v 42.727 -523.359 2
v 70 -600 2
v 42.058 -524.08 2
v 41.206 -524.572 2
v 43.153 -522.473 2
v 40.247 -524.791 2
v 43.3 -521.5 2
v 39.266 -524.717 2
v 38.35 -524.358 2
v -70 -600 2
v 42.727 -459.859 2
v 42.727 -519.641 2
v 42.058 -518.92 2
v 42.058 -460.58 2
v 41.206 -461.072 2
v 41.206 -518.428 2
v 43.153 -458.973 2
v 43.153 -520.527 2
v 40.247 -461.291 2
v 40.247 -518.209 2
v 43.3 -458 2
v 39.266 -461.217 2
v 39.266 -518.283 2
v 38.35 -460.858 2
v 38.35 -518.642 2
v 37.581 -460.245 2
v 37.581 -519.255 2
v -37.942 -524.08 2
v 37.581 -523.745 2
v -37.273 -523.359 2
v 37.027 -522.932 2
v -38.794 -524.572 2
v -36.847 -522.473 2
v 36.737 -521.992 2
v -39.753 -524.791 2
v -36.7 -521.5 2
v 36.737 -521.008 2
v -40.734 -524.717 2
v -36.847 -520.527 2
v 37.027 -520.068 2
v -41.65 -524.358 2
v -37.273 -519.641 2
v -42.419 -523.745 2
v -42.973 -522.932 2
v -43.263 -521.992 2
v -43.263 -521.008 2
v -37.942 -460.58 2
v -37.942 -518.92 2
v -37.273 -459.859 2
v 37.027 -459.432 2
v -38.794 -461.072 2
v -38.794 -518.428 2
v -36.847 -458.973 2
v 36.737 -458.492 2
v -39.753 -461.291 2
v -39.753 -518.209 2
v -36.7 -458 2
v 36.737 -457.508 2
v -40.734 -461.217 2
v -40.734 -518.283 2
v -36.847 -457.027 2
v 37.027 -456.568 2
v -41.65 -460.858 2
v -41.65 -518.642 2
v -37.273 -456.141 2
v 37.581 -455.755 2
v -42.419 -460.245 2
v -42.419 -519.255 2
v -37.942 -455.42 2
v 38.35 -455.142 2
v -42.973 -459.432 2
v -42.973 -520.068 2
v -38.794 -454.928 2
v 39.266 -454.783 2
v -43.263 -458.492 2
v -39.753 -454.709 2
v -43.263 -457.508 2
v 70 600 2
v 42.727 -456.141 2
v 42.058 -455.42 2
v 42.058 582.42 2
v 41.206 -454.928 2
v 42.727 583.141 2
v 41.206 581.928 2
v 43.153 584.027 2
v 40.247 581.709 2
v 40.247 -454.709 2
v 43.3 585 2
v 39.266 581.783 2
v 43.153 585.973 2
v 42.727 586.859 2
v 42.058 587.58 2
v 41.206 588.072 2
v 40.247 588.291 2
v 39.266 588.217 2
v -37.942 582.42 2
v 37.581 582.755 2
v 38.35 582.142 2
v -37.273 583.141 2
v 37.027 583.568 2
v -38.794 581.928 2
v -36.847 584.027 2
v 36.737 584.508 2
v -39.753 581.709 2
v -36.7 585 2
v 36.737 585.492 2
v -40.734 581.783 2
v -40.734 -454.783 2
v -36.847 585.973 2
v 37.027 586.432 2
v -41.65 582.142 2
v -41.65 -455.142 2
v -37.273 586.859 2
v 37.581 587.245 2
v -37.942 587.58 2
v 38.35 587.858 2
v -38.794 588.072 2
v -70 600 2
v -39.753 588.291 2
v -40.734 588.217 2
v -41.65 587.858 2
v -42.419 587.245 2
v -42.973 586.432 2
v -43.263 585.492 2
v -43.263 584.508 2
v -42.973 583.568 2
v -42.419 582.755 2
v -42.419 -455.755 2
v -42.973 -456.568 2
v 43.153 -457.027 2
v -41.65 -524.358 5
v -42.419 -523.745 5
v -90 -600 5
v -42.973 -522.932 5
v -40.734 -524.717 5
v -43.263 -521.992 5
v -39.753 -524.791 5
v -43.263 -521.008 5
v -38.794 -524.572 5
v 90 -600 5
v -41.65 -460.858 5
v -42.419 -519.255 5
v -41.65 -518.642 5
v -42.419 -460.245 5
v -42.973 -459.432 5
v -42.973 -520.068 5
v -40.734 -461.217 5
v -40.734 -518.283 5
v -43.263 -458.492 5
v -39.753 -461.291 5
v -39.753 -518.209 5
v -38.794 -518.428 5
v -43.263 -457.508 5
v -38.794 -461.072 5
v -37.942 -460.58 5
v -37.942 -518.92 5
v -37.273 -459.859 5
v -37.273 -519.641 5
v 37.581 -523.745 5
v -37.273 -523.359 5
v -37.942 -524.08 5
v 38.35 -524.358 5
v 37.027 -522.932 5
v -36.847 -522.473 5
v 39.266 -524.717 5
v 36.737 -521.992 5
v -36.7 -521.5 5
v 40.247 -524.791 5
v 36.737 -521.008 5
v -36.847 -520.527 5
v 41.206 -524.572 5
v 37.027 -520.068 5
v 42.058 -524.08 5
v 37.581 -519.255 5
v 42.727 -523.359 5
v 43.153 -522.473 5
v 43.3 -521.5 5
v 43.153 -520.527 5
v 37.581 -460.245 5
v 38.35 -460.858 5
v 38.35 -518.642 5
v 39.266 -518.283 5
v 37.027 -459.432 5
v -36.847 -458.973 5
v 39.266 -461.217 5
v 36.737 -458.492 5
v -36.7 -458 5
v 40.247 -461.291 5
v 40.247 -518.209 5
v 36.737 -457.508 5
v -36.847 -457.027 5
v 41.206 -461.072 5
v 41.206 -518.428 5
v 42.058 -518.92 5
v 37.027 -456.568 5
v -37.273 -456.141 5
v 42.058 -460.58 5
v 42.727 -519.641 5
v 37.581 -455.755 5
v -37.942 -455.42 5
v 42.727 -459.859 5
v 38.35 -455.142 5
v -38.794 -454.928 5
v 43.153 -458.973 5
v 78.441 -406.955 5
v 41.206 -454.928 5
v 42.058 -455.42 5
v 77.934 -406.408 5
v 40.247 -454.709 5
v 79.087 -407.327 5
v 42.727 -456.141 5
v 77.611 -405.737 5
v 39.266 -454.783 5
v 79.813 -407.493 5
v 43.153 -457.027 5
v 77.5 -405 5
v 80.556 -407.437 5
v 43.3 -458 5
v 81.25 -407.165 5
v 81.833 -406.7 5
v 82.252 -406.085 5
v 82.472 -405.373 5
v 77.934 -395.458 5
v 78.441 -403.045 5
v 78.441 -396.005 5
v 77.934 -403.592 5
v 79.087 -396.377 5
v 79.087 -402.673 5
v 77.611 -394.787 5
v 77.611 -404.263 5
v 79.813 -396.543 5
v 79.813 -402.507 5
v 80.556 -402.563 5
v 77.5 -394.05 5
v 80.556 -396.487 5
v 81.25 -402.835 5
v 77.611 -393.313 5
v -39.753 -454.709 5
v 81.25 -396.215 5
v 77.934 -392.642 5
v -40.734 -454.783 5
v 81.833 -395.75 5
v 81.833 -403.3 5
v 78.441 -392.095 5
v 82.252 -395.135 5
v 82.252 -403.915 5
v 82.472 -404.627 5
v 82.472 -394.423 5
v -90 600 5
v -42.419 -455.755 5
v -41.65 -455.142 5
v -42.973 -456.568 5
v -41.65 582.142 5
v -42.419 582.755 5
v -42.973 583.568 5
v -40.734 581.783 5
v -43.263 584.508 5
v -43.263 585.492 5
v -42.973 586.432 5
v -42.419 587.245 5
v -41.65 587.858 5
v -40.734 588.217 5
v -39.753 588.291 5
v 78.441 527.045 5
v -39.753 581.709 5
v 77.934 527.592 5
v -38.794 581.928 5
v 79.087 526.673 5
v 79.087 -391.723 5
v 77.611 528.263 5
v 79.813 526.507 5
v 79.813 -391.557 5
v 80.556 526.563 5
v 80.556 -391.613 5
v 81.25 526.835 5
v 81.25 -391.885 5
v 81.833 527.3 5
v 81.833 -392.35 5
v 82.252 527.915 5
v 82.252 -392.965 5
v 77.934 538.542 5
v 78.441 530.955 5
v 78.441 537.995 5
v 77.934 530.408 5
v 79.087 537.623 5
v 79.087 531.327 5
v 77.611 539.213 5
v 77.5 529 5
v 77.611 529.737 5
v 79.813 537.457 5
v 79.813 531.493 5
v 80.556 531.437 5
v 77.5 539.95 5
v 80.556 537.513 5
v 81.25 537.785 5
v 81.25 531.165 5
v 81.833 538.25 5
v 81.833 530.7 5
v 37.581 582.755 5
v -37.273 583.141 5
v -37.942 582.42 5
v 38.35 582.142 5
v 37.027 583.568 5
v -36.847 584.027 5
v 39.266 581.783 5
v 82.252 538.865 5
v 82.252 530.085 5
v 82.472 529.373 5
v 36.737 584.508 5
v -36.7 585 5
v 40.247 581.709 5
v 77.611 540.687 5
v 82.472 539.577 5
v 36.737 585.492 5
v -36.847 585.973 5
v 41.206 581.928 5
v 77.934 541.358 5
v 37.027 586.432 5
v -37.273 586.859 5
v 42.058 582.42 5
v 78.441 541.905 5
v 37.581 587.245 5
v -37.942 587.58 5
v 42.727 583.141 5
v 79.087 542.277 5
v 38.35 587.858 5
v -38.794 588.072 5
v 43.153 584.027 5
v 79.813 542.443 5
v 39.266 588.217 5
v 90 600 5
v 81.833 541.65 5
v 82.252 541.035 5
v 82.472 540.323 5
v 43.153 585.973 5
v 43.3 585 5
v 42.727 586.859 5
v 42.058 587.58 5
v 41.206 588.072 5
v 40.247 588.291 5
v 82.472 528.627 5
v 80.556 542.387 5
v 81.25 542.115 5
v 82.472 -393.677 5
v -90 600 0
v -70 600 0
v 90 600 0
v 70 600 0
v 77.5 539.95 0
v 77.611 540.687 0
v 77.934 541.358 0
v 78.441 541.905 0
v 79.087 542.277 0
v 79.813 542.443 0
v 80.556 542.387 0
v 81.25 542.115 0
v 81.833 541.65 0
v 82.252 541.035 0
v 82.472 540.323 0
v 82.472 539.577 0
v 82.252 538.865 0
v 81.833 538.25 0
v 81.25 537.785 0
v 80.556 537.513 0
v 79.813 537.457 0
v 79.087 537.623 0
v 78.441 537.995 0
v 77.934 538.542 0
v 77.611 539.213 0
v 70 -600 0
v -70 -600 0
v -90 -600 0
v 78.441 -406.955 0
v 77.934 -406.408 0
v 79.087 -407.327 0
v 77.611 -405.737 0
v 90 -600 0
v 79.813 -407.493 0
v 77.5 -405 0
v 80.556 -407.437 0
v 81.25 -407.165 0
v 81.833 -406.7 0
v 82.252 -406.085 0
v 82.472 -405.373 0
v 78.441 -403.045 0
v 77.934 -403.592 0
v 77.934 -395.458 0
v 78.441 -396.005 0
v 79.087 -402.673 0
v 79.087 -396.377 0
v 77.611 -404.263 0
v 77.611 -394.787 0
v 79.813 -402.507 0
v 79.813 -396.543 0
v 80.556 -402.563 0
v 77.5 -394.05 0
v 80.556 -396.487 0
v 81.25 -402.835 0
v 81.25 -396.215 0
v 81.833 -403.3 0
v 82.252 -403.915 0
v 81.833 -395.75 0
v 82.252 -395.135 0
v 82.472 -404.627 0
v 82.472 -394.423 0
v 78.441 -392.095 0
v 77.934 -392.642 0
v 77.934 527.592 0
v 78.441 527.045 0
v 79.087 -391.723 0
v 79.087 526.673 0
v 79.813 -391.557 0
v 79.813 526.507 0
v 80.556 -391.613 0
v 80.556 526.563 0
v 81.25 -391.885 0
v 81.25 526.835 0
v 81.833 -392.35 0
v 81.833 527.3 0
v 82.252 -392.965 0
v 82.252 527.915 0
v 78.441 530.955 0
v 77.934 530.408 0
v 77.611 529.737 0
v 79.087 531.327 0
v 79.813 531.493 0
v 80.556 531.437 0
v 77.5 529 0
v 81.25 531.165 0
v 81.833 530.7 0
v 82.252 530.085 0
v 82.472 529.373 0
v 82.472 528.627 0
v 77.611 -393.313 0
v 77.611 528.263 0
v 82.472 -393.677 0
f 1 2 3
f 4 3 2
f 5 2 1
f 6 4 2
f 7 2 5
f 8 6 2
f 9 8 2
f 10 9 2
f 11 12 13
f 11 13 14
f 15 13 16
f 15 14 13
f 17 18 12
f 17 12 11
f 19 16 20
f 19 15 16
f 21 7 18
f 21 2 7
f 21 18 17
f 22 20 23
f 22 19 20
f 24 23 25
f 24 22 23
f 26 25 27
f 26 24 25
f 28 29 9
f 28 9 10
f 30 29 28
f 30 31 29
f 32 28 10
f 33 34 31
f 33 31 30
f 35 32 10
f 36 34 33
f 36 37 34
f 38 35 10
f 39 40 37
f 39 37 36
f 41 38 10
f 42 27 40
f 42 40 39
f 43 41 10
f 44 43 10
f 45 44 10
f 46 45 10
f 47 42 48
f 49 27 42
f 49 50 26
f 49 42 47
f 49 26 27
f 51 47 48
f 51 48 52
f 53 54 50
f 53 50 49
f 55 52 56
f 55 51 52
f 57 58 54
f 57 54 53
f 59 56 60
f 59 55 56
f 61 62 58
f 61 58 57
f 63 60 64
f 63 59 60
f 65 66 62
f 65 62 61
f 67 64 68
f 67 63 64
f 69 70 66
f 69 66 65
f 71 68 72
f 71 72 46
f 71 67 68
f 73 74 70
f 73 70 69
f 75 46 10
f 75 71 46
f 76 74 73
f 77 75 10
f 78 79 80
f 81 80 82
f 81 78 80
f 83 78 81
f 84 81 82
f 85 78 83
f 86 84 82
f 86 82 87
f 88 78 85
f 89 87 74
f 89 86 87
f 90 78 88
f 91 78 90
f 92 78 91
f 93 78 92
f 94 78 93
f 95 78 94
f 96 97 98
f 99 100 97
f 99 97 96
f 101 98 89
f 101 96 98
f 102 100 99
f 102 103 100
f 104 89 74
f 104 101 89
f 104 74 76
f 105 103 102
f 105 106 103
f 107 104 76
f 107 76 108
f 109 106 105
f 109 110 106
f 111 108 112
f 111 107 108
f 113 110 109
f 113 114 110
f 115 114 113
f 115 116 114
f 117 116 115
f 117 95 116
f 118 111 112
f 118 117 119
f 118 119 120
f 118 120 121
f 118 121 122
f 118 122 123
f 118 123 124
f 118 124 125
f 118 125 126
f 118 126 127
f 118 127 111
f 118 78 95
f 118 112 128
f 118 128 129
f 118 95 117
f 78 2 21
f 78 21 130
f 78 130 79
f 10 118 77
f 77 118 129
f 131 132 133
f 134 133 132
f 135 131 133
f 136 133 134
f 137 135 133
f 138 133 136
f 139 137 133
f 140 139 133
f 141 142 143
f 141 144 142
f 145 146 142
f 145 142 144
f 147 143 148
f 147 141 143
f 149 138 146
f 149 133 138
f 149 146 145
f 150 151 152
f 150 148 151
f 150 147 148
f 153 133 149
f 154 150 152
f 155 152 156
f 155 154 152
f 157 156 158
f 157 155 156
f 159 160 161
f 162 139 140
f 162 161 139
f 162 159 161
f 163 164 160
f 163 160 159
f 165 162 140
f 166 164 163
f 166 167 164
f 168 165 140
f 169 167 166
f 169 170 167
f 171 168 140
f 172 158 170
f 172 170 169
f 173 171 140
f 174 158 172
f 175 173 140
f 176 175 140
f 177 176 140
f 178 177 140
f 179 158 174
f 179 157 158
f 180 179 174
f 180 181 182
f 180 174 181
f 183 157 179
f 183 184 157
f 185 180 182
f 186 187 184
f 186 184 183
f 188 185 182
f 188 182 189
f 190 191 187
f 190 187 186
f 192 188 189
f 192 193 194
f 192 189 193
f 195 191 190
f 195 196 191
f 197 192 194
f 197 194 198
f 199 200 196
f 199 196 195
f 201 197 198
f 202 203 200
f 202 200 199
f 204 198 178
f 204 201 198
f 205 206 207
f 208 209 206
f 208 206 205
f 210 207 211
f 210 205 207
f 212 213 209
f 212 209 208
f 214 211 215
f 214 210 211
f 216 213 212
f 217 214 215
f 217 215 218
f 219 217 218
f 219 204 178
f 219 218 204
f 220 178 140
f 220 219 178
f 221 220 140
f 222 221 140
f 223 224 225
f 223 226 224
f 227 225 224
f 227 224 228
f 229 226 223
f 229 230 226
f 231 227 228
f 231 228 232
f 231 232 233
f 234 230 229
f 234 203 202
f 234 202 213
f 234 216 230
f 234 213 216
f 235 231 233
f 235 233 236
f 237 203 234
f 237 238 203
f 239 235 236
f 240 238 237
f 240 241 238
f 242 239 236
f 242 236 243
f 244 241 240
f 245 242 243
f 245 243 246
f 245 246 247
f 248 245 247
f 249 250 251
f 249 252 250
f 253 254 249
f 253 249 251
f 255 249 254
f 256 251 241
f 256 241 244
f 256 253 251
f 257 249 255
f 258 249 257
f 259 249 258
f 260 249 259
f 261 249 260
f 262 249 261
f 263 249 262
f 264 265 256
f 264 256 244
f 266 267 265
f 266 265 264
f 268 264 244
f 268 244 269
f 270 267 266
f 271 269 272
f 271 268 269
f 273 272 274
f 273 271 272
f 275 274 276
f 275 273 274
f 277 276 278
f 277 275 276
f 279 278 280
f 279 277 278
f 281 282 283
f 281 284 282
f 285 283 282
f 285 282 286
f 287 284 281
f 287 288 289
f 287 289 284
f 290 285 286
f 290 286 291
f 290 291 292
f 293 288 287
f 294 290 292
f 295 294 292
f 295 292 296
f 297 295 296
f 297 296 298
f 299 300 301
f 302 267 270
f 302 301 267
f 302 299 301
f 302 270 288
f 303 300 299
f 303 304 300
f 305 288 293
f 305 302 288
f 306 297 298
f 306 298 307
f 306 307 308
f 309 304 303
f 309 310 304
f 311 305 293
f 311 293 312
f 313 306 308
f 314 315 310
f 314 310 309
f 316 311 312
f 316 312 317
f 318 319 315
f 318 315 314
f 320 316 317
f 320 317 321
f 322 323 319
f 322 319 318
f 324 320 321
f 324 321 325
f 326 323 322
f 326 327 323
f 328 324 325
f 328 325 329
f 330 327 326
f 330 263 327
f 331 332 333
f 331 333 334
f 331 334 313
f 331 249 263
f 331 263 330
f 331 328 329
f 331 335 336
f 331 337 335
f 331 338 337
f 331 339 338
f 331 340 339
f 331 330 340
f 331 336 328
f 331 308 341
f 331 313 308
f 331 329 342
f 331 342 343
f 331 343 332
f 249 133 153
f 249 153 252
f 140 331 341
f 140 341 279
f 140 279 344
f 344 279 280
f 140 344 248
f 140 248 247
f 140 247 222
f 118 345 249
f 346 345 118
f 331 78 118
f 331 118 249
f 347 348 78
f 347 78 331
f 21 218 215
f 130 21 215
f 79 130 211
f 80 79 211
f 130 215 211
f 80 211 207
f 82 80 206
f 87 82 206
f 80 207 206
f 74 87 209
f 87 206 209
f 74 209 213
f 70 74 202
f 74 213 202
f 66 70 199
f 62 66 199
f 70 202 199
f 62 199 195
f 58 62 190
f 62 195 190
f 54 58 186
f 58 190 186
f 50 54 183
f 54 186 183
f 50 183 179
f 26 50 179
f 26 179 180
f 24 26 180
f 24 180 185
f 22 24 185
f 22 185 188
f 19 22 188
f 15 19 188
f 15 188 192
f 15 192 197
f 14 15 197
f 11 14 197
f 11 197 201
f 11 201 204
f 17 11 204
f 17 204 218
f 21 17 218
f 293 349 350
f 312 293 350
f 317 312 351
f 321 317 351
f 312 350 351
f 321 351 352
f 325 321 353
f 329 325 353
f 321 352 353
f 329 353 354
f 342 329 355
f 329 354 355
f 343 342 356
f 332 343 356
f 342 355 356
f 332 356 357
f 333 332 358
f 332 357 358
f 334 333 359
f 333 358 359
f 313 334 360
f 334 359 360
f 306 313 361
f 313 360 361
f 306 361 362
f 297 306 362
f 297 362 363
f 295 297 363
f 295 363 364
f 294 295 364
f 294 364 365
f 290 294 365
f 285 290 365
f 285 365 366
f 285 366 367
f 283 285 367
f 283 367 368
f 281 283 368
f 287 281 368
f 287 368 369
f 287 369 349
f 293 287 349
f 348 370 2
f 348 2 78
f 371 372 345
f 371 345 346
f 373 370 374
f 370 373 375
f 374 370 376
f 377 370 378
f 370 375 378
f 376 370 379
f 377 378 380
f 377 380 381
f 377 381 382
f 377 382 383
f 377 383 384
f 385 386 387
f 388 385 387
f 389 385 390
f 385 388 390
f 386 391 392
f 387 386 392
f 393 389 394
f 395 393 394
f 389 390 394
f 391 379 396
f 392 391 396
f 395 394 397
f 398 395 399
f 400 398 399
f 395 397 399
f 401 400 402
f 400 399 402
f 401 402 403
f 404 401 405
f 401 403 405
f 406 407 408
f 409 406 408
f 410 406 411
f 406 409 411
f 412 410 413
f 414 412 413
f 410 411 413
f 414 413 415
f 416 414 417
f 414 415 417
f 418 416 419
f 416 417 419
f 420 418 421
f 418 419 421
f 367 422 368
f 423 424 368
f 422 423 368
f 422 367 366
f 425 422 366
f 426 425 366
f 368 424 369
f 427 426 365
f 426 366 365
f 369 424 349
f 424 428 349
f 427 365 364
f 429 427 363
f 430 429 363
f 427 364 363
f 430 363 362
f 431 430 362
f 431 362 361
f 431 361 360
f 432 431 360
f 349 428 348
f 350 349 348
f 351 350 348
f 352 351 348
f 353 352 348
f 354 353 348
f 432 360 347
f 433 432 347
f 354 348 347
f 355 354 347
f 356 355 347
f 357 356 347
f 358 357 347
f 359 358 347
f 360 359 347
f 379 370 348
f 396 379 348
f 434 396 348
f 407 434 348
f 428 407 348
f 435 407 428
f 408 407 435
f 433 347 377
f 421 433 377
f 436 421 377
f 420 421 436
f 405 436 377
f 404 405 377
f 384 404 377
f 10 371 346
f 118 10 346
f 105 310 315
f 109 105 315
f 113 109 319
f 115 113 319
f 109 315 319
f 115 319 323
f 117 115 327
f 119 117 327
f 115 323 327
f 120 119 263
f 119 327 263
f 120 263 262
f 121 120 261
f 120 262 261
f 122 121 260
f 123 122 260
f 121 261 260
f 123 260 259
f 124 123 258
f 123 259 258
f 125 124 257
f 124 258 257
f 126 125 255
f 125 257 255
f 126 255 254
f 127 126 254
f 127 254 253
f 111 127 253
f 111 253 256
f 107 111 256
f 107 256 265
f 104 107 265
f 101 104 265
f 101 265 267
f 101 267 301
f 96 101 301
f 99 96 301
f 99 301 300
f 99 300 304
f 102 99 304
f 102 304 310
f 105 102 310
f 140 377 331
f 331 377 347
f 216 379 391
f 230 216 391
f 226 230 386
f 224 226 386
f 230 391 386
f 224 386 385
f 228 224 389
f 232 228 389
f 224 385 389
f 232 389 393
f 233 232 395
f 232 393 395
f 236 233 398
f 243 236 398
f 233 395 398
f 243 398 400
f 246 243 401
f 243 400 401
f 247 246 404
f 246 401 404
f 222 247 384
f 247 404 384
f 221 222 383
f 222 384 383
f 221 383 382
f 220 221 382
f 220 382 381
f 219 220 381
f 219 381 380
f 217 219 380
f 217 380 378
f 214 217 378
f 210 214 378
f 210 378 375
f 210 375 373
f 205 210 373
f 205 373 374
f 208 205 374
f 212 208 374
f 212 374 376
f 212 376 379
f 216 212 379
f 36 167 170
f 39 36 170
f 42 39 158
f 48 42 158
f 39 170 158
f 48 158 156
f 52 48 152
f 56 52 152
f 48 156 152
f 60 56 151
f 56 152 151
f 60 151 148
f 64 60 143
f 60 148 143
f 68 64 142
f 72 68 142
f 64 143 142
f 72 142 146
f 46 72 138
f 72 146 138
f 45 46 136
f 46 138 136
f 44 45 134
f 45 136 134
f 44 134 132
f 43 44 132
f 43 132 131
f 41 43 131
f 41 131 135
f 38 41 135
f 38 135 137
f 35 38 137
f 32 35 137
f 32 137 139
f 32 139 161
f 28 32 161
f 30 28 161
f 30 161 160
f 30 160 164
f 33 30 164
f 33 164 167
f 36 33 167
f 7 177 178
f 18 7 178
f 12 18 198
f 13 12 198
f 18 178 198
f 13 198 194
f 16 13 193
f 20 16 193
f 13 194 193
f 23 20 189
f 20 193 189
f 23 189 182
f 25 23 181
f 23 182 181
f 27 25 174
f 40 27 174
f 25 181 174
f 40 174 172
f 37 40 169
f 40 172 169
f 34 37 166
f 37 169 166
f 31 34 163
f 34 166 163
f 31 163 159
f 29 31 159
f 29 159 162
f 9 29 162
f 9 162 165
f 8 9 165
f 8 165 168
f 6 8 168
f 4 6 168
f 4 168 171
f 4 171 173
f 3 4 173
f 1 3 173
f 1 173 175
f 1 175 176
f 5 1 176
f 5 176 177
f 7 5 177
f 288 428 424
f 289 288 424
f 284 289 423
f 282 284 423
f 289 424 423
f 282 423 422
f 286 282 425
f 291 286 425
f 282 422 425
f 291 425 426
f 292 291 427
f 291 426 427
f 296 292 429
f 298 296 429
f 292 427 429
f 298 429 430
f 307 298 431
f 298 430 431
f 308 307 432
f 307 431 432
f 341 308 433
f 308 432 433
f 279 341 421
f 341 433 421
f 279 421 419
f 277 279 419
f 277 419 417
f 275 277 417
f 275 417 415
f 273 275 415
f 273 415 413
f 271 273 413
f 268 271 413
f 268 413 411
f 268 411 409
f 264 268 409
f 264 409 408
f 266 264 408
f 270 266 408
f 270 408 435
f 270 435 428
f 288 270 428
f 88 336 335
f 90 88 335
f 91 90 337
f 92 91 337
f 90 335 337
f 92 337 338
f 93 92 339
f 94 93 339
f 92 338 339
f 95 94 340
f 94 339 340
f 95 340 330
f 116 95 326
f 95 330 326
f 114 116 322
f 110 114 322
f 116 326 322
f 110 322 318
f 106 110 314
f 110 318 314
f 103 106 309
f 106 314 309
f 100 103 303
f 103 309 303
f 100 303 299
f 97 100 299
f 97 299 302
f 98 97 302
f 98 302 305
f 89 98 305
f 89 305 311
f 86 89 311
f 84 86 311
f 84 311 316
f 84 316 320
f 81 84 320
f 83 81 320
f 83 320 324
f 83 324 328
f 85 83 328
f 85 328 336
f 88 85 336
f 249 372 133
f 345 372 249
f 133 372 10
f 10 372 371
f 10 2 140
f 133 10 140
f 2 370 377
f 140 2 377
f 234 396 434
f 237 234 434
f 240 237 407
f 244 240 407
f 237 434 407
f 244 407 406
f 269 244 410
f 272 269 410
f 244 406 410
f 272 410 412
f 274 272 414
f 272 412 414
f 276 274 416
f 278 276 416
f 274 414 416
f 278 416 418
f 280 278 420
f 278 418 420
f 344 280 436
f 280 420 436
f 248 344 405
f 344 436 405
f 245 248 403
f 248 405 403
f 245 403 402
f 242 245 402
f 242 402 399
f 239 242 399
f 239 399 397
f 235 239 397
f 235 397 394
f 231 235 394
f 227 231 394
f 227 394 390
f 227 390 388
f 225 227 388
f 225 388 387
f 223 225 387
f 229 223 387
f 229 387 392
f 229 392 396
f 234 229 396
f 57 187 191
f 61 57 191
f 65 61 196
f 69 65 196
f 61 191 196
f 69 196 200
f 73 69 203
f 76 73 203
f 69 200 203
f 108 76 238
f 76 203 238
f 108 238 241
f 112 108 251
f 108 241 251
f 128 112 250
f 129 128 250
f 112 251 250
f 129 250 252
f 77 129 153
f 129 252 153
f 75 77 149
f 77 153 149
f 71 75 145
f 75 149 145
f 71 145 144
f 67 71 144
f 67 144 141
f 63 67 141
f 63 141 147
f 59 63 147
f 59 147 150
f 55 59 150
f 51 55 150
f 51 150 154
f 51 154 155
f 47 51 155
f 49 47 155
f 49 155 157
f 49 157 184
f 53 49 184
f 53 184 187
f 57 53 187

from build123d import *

# Parameters (mm, degrees)
SKETCH1_W           = 180
SKETCH1_H           = 1200
BOSS_EXTRUDE1_DEPTH = 5
SKETCH2_W           = 140
SKETCH2_H           = 1200
CUT_EXTRUDE1_DEPTH  = 2
SKETCH3_R           = 3.3
CUT_EXTRUDE2_DEPTH  = 6
SKETCH4_R           = 2.5
CUT_EXTRUDE3_DEPTH  = 6


with BuildPart() as part:
    # Sketch1 → Boss-Extrude1 (new body)
    with BuildSketch(Plane.XY):
        Rectangle(SKETCH1_W, SKETCH1_H)
    extrude(amount=BOSS_EXTRUDE1_DEPTH)

    # Sketch2 → Cut-Extrude1 (cut)
    with BuildSketch(Plane(origin=(0, 0, 0), x_dir=(-1, 0, 0), z_dir=(0, 0, -1))):
        Rectangle(SKETCH2_W, SKETCH2_H)
    extrude(amount=-CUT_EXTRUDE1_DEPTH, mode=Mode.SUBTRACT)

    # Sketch3 → Cut-Extrude2 (cut, through all)
    with BuildSketch(Plane.XY.offset(5)):
        with Locations((-40, -521.5)):
            Circle(SKETCH3_R)
        with Locations((-40, -458)):
            Circle(SKETCH3_R)
        with Locations((-40, 585)):
            Circle(SKETCH3_R)
        with Locations((40, 585)):
            Circle(SKETCH3_R)
        with Locations((40, -458)):
            Circle(SKETCH3_R)
        with Locations((40, -521.5)):
            Circle(SKETCH3_R)
    extrude(amount=-CUT_EXTRUDE2_DEPTH, mode=Mode.SUBTRACT)

    # Sketch4 → Cut-Extrude3 (cut, through all)
    with BuildSketch(Plane(origin=(0, 0, 0), x_dir=(-1, 0, 0), z_dir=(0, 0, -1))):
        with Locations((-80, 539.95)):
            Circle(SKETCH4_R)
        with Locations((-80, 529)):
            Circle(SKETCH4_R)
        with Locations((-80, -394.05)):
            Circle(SKETCH4_R)
        with Locations((-80, -405)):
            Circle(SKETCH4_R)
    extrude(amount=-CUT_EXTRUDE3_DEPTH, mode=Mode.SUBTRACT)


solid = part.part
